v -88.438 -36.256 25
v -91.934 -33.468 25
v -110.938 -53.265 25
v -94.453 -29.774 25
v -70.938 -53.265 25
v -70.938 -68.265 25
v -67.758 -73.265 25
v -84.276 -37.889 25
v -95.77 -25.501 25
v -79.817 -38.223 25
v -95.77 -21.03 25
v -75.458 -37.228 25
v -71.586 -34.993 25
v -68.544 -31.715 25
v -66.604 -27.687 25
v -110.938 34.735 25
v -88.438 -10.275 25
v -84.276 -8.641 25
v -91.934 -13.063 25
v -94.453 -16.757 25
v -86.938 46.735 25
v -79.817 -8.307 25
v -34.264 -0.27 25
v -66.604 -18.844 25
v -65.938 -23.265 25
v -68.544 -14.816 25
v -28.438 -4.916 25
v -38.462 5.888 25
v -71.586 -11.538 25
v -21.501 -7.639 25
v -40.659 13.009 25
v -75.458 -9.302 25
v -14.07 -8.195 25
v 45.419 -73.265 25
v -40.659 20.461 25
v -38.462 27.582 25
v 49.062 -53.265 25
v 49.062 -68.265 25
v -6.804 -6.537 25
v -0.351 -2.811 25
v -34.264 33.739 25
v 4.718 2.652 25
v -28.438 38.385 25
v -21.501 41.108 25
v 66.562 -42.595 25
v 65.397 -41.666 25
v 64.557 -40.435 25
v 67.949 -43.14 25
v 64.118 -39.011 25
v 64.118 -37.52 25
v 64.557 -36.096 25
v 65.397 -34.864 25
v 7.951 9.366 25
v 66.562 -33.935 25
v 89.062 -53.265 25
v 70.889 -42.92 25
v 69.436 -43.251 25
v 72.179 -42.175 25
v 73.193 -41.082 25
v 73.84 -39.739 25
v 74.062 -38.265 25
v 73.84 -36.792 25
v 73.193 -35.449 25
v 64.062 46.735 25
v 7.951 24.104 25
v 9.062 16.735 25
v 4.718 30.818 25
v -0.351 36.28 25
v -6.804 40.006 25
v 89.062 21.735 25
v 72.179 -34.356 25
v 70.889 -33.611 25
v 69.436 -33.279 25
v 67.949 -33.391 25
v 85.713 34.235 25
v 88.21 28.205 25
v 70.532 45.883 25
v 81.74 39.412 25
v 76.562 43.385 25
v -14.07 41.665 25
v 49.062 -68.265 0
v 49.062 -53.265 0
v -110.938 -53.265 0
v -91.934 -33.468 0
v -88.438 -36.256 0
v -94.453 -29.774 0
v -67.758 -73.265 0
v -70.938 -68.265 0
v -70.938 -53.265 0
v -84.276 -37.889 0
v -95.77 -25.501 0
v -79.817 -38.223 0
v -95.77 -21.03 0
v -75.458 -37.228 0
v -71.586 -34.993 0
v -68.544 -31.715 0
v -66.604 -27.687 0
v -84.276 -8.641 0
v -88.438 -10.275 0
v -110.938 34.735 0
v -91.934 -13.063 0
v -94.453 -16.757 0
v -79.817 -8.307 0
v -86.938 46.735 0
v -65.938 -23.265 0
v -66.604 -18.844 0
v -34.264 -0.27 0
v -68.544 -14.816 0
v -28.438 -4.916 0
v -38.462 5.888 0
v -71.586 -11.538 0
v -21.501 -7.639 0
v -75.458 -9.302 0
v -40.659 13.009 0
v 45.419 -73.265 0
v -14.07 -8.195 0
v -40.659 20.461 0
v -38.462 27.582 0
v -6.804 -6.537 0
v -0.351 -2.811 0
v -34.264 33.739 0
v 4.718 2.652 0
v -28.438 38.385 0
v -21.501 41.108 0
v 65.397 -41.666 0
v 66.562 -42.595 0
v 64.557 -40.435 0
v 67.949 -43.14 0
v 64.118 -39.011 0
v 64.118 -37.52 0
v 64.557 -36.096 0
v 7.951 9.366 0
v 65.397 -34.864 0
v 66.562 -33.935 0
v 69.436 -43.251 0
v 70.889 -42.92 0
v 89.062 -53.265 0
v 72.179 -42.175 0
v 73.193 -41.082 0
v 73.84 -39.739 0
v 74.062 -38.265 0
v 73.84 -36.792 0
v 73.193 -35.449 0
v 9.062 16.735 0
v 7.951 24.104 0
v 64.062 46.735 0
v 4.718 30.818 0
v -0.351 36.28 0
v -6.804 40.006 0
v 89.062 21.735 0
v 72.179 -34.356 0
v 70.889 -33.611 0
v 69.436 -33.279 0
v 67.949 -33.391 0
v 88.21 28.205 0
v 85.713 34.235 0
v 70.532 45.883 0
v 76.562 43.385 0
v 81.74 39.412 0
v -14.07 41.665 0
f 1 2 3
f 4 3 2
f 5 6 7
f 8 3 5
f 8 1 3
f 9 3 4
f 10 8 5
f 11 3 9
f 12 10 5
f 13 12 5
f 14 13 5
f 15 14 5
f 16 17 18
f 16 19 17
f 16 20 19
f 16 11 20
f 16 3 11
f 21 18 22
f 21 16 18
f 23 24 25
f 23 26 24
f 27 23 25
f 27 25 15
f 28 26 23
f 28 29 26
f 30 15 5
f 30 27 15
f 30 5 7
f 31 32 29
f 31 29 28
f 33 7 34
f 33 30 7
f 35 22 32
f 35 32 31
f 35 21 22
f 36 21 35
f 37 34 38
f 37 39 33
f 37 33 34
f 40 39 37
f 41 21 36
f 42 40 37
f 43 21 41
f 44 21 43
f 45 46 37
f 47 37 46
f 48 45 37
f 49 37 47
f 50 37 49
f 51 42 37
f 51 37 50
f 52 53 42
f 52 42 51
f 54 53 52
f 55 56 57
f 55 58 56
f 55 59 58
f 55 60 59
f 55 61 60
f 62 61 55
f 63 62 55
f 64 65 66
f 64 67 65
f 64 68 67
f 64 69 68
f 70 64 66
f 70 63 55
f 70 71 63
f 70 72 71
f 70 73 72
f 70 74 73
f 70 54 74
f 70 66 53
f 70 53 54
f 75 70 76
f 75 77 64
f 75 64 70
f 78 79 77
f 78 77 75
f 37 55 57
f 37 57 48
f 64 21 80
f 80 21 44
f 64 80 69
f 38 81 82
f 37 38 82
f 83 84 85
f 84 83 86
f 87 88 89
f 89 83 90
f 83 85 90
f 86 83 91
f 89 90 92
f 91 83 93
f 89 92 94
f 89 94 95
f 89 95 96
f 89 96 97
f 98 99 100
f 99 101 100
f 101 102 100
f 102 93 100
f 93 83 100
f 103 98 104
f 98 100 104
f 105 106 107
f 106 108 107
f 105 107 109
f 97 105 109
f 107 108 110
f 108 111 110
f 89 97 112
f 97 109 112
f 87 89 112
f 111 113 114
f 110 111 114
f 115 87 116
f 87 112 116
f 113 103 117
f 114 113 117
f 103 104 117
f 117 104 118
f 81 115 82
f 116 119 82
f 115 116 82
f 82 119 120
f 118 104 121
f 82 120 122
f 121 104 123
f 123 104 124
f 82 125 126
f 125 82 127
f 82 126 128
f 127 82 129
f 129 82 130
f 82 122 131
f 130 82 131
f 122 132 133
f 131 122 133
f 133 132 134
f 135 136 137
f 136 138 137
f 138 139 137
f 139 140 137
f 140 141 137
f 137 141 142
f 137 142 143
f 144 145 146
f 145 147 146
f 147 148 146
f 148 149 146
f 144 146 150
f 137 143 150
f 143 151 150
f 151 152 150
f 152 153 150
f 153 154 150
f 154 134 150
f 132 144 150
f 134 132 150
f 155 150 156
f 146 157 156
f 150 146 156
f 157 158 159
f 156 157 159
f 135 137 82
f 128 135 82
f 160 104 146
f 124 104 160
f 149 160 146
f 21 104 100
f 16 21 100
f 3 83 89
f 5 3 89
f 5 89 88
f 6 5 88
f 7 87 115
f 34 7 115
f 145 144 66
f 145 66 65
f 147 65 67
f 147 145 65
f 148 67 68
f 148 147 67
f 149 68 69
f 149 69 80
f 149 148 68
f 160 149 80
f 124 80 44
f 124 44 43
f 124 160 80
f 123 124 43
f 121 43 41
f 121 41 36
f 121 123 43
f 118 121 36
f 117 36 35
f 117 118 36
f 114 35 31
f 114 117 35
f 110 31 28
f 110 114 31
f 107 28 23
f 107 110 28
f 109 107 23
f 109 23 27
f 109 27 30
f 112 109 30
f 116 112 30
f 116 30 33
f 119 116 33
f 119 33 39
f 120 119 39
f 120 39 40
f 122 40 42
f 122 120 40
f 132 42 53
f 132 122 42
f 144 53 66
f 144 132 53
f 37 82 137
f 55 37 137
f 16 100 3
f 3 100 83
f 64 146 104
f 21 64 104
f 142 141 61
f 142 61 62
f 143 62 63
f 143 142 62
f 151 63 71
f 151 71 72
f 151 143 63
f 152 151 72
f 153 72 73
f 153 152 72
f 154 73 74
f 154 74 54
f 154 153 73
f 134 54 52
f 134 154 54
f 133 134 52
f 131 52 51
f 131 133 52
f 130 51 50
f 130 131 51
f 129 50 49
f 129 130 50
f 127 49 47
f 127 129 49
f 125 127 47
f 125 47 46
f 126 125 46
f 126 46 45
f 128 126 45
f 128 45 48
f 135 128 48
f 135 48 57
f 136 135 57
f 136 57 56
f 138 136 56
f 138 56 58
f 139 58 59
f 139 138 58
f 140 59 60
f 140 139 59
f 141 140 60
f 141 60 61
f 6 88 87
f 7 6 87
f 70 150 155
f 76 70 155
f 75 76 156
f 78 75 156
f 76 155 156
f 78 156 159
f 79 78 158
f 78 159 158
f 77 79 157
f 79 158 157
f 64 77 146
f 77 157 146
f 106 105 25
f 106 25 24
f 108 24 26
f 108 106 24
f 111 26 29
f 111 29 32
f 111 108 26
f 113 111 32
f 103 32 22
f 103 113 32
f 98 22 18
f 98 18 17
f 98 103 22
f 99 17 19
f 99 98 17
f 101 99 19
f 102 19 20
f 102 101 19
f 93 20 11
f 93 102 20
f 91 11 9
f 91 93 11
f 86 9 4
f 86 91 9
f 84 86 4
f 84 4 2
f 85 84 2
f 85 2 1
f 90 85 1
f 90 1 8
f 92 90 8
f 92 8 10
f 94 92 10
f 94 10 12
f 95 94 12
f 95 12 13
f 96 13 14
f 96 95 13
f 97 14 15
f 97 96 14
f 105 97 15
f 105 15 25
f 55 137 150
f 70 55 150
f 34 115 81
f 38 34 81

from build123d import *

# Parameters (mm, degrees)
F0_R     = 15
F0_R_2   = 5
F0_R_3   = 25
F1_DEPTH = 25


with BuildPart() as f1:
    # F0 (on Top) → F1 (new body)
    with BuildSketch(Plane.XY):
        with BuildLine():
            Line((-70.938008, -68.265357), (-67.75825, -73.265357))
            Line((-67.75825, -73.265357), (45.419062, -73.265357))
            Line((45.419062, -73.265357), (49.061992, -68.265357))
            Line((49.061992, -68.265357), (49.061992, -53.265357))
            Line((49.061992, -53.265357), (89.061992, -53.265357))
            Line((89.061992, -53.265357), (89.061992, 21.734643))
            ThreePointArc((89.061992, 21.734643), (81.739661, 39.412313), (64.061992, 46.734643))
            Line((64.061992, 46.734643), (-86.938008, 46.734643))
            Line((-86.938008, 46.734643), (-110.938008, 34.734643))
            Line((-110.938008, 34.734643), (-110.938008, -53.265357))
            Line((-110.938008, -53.265357), (-70.938008, -53.265357))
            Line((-70.938008, -53.265357), (-70.938008, -68.265357))
        make_face()
        with Locations((-80.938008, -23.265357)):
            Circle(F0_R, mode=Mode.SUBTRACT)
        with Locations((69.061992, -38.265357)):
            Circle(F0_R_2, mode=Mode.SUBTRACT)
        with Locations((-15.938008, 16.734643)):
            Circle(F0_R_3, mode=Mode.SUBTRACT)
    extrude(amount=F1_DEPTH)


solid = f1.part
